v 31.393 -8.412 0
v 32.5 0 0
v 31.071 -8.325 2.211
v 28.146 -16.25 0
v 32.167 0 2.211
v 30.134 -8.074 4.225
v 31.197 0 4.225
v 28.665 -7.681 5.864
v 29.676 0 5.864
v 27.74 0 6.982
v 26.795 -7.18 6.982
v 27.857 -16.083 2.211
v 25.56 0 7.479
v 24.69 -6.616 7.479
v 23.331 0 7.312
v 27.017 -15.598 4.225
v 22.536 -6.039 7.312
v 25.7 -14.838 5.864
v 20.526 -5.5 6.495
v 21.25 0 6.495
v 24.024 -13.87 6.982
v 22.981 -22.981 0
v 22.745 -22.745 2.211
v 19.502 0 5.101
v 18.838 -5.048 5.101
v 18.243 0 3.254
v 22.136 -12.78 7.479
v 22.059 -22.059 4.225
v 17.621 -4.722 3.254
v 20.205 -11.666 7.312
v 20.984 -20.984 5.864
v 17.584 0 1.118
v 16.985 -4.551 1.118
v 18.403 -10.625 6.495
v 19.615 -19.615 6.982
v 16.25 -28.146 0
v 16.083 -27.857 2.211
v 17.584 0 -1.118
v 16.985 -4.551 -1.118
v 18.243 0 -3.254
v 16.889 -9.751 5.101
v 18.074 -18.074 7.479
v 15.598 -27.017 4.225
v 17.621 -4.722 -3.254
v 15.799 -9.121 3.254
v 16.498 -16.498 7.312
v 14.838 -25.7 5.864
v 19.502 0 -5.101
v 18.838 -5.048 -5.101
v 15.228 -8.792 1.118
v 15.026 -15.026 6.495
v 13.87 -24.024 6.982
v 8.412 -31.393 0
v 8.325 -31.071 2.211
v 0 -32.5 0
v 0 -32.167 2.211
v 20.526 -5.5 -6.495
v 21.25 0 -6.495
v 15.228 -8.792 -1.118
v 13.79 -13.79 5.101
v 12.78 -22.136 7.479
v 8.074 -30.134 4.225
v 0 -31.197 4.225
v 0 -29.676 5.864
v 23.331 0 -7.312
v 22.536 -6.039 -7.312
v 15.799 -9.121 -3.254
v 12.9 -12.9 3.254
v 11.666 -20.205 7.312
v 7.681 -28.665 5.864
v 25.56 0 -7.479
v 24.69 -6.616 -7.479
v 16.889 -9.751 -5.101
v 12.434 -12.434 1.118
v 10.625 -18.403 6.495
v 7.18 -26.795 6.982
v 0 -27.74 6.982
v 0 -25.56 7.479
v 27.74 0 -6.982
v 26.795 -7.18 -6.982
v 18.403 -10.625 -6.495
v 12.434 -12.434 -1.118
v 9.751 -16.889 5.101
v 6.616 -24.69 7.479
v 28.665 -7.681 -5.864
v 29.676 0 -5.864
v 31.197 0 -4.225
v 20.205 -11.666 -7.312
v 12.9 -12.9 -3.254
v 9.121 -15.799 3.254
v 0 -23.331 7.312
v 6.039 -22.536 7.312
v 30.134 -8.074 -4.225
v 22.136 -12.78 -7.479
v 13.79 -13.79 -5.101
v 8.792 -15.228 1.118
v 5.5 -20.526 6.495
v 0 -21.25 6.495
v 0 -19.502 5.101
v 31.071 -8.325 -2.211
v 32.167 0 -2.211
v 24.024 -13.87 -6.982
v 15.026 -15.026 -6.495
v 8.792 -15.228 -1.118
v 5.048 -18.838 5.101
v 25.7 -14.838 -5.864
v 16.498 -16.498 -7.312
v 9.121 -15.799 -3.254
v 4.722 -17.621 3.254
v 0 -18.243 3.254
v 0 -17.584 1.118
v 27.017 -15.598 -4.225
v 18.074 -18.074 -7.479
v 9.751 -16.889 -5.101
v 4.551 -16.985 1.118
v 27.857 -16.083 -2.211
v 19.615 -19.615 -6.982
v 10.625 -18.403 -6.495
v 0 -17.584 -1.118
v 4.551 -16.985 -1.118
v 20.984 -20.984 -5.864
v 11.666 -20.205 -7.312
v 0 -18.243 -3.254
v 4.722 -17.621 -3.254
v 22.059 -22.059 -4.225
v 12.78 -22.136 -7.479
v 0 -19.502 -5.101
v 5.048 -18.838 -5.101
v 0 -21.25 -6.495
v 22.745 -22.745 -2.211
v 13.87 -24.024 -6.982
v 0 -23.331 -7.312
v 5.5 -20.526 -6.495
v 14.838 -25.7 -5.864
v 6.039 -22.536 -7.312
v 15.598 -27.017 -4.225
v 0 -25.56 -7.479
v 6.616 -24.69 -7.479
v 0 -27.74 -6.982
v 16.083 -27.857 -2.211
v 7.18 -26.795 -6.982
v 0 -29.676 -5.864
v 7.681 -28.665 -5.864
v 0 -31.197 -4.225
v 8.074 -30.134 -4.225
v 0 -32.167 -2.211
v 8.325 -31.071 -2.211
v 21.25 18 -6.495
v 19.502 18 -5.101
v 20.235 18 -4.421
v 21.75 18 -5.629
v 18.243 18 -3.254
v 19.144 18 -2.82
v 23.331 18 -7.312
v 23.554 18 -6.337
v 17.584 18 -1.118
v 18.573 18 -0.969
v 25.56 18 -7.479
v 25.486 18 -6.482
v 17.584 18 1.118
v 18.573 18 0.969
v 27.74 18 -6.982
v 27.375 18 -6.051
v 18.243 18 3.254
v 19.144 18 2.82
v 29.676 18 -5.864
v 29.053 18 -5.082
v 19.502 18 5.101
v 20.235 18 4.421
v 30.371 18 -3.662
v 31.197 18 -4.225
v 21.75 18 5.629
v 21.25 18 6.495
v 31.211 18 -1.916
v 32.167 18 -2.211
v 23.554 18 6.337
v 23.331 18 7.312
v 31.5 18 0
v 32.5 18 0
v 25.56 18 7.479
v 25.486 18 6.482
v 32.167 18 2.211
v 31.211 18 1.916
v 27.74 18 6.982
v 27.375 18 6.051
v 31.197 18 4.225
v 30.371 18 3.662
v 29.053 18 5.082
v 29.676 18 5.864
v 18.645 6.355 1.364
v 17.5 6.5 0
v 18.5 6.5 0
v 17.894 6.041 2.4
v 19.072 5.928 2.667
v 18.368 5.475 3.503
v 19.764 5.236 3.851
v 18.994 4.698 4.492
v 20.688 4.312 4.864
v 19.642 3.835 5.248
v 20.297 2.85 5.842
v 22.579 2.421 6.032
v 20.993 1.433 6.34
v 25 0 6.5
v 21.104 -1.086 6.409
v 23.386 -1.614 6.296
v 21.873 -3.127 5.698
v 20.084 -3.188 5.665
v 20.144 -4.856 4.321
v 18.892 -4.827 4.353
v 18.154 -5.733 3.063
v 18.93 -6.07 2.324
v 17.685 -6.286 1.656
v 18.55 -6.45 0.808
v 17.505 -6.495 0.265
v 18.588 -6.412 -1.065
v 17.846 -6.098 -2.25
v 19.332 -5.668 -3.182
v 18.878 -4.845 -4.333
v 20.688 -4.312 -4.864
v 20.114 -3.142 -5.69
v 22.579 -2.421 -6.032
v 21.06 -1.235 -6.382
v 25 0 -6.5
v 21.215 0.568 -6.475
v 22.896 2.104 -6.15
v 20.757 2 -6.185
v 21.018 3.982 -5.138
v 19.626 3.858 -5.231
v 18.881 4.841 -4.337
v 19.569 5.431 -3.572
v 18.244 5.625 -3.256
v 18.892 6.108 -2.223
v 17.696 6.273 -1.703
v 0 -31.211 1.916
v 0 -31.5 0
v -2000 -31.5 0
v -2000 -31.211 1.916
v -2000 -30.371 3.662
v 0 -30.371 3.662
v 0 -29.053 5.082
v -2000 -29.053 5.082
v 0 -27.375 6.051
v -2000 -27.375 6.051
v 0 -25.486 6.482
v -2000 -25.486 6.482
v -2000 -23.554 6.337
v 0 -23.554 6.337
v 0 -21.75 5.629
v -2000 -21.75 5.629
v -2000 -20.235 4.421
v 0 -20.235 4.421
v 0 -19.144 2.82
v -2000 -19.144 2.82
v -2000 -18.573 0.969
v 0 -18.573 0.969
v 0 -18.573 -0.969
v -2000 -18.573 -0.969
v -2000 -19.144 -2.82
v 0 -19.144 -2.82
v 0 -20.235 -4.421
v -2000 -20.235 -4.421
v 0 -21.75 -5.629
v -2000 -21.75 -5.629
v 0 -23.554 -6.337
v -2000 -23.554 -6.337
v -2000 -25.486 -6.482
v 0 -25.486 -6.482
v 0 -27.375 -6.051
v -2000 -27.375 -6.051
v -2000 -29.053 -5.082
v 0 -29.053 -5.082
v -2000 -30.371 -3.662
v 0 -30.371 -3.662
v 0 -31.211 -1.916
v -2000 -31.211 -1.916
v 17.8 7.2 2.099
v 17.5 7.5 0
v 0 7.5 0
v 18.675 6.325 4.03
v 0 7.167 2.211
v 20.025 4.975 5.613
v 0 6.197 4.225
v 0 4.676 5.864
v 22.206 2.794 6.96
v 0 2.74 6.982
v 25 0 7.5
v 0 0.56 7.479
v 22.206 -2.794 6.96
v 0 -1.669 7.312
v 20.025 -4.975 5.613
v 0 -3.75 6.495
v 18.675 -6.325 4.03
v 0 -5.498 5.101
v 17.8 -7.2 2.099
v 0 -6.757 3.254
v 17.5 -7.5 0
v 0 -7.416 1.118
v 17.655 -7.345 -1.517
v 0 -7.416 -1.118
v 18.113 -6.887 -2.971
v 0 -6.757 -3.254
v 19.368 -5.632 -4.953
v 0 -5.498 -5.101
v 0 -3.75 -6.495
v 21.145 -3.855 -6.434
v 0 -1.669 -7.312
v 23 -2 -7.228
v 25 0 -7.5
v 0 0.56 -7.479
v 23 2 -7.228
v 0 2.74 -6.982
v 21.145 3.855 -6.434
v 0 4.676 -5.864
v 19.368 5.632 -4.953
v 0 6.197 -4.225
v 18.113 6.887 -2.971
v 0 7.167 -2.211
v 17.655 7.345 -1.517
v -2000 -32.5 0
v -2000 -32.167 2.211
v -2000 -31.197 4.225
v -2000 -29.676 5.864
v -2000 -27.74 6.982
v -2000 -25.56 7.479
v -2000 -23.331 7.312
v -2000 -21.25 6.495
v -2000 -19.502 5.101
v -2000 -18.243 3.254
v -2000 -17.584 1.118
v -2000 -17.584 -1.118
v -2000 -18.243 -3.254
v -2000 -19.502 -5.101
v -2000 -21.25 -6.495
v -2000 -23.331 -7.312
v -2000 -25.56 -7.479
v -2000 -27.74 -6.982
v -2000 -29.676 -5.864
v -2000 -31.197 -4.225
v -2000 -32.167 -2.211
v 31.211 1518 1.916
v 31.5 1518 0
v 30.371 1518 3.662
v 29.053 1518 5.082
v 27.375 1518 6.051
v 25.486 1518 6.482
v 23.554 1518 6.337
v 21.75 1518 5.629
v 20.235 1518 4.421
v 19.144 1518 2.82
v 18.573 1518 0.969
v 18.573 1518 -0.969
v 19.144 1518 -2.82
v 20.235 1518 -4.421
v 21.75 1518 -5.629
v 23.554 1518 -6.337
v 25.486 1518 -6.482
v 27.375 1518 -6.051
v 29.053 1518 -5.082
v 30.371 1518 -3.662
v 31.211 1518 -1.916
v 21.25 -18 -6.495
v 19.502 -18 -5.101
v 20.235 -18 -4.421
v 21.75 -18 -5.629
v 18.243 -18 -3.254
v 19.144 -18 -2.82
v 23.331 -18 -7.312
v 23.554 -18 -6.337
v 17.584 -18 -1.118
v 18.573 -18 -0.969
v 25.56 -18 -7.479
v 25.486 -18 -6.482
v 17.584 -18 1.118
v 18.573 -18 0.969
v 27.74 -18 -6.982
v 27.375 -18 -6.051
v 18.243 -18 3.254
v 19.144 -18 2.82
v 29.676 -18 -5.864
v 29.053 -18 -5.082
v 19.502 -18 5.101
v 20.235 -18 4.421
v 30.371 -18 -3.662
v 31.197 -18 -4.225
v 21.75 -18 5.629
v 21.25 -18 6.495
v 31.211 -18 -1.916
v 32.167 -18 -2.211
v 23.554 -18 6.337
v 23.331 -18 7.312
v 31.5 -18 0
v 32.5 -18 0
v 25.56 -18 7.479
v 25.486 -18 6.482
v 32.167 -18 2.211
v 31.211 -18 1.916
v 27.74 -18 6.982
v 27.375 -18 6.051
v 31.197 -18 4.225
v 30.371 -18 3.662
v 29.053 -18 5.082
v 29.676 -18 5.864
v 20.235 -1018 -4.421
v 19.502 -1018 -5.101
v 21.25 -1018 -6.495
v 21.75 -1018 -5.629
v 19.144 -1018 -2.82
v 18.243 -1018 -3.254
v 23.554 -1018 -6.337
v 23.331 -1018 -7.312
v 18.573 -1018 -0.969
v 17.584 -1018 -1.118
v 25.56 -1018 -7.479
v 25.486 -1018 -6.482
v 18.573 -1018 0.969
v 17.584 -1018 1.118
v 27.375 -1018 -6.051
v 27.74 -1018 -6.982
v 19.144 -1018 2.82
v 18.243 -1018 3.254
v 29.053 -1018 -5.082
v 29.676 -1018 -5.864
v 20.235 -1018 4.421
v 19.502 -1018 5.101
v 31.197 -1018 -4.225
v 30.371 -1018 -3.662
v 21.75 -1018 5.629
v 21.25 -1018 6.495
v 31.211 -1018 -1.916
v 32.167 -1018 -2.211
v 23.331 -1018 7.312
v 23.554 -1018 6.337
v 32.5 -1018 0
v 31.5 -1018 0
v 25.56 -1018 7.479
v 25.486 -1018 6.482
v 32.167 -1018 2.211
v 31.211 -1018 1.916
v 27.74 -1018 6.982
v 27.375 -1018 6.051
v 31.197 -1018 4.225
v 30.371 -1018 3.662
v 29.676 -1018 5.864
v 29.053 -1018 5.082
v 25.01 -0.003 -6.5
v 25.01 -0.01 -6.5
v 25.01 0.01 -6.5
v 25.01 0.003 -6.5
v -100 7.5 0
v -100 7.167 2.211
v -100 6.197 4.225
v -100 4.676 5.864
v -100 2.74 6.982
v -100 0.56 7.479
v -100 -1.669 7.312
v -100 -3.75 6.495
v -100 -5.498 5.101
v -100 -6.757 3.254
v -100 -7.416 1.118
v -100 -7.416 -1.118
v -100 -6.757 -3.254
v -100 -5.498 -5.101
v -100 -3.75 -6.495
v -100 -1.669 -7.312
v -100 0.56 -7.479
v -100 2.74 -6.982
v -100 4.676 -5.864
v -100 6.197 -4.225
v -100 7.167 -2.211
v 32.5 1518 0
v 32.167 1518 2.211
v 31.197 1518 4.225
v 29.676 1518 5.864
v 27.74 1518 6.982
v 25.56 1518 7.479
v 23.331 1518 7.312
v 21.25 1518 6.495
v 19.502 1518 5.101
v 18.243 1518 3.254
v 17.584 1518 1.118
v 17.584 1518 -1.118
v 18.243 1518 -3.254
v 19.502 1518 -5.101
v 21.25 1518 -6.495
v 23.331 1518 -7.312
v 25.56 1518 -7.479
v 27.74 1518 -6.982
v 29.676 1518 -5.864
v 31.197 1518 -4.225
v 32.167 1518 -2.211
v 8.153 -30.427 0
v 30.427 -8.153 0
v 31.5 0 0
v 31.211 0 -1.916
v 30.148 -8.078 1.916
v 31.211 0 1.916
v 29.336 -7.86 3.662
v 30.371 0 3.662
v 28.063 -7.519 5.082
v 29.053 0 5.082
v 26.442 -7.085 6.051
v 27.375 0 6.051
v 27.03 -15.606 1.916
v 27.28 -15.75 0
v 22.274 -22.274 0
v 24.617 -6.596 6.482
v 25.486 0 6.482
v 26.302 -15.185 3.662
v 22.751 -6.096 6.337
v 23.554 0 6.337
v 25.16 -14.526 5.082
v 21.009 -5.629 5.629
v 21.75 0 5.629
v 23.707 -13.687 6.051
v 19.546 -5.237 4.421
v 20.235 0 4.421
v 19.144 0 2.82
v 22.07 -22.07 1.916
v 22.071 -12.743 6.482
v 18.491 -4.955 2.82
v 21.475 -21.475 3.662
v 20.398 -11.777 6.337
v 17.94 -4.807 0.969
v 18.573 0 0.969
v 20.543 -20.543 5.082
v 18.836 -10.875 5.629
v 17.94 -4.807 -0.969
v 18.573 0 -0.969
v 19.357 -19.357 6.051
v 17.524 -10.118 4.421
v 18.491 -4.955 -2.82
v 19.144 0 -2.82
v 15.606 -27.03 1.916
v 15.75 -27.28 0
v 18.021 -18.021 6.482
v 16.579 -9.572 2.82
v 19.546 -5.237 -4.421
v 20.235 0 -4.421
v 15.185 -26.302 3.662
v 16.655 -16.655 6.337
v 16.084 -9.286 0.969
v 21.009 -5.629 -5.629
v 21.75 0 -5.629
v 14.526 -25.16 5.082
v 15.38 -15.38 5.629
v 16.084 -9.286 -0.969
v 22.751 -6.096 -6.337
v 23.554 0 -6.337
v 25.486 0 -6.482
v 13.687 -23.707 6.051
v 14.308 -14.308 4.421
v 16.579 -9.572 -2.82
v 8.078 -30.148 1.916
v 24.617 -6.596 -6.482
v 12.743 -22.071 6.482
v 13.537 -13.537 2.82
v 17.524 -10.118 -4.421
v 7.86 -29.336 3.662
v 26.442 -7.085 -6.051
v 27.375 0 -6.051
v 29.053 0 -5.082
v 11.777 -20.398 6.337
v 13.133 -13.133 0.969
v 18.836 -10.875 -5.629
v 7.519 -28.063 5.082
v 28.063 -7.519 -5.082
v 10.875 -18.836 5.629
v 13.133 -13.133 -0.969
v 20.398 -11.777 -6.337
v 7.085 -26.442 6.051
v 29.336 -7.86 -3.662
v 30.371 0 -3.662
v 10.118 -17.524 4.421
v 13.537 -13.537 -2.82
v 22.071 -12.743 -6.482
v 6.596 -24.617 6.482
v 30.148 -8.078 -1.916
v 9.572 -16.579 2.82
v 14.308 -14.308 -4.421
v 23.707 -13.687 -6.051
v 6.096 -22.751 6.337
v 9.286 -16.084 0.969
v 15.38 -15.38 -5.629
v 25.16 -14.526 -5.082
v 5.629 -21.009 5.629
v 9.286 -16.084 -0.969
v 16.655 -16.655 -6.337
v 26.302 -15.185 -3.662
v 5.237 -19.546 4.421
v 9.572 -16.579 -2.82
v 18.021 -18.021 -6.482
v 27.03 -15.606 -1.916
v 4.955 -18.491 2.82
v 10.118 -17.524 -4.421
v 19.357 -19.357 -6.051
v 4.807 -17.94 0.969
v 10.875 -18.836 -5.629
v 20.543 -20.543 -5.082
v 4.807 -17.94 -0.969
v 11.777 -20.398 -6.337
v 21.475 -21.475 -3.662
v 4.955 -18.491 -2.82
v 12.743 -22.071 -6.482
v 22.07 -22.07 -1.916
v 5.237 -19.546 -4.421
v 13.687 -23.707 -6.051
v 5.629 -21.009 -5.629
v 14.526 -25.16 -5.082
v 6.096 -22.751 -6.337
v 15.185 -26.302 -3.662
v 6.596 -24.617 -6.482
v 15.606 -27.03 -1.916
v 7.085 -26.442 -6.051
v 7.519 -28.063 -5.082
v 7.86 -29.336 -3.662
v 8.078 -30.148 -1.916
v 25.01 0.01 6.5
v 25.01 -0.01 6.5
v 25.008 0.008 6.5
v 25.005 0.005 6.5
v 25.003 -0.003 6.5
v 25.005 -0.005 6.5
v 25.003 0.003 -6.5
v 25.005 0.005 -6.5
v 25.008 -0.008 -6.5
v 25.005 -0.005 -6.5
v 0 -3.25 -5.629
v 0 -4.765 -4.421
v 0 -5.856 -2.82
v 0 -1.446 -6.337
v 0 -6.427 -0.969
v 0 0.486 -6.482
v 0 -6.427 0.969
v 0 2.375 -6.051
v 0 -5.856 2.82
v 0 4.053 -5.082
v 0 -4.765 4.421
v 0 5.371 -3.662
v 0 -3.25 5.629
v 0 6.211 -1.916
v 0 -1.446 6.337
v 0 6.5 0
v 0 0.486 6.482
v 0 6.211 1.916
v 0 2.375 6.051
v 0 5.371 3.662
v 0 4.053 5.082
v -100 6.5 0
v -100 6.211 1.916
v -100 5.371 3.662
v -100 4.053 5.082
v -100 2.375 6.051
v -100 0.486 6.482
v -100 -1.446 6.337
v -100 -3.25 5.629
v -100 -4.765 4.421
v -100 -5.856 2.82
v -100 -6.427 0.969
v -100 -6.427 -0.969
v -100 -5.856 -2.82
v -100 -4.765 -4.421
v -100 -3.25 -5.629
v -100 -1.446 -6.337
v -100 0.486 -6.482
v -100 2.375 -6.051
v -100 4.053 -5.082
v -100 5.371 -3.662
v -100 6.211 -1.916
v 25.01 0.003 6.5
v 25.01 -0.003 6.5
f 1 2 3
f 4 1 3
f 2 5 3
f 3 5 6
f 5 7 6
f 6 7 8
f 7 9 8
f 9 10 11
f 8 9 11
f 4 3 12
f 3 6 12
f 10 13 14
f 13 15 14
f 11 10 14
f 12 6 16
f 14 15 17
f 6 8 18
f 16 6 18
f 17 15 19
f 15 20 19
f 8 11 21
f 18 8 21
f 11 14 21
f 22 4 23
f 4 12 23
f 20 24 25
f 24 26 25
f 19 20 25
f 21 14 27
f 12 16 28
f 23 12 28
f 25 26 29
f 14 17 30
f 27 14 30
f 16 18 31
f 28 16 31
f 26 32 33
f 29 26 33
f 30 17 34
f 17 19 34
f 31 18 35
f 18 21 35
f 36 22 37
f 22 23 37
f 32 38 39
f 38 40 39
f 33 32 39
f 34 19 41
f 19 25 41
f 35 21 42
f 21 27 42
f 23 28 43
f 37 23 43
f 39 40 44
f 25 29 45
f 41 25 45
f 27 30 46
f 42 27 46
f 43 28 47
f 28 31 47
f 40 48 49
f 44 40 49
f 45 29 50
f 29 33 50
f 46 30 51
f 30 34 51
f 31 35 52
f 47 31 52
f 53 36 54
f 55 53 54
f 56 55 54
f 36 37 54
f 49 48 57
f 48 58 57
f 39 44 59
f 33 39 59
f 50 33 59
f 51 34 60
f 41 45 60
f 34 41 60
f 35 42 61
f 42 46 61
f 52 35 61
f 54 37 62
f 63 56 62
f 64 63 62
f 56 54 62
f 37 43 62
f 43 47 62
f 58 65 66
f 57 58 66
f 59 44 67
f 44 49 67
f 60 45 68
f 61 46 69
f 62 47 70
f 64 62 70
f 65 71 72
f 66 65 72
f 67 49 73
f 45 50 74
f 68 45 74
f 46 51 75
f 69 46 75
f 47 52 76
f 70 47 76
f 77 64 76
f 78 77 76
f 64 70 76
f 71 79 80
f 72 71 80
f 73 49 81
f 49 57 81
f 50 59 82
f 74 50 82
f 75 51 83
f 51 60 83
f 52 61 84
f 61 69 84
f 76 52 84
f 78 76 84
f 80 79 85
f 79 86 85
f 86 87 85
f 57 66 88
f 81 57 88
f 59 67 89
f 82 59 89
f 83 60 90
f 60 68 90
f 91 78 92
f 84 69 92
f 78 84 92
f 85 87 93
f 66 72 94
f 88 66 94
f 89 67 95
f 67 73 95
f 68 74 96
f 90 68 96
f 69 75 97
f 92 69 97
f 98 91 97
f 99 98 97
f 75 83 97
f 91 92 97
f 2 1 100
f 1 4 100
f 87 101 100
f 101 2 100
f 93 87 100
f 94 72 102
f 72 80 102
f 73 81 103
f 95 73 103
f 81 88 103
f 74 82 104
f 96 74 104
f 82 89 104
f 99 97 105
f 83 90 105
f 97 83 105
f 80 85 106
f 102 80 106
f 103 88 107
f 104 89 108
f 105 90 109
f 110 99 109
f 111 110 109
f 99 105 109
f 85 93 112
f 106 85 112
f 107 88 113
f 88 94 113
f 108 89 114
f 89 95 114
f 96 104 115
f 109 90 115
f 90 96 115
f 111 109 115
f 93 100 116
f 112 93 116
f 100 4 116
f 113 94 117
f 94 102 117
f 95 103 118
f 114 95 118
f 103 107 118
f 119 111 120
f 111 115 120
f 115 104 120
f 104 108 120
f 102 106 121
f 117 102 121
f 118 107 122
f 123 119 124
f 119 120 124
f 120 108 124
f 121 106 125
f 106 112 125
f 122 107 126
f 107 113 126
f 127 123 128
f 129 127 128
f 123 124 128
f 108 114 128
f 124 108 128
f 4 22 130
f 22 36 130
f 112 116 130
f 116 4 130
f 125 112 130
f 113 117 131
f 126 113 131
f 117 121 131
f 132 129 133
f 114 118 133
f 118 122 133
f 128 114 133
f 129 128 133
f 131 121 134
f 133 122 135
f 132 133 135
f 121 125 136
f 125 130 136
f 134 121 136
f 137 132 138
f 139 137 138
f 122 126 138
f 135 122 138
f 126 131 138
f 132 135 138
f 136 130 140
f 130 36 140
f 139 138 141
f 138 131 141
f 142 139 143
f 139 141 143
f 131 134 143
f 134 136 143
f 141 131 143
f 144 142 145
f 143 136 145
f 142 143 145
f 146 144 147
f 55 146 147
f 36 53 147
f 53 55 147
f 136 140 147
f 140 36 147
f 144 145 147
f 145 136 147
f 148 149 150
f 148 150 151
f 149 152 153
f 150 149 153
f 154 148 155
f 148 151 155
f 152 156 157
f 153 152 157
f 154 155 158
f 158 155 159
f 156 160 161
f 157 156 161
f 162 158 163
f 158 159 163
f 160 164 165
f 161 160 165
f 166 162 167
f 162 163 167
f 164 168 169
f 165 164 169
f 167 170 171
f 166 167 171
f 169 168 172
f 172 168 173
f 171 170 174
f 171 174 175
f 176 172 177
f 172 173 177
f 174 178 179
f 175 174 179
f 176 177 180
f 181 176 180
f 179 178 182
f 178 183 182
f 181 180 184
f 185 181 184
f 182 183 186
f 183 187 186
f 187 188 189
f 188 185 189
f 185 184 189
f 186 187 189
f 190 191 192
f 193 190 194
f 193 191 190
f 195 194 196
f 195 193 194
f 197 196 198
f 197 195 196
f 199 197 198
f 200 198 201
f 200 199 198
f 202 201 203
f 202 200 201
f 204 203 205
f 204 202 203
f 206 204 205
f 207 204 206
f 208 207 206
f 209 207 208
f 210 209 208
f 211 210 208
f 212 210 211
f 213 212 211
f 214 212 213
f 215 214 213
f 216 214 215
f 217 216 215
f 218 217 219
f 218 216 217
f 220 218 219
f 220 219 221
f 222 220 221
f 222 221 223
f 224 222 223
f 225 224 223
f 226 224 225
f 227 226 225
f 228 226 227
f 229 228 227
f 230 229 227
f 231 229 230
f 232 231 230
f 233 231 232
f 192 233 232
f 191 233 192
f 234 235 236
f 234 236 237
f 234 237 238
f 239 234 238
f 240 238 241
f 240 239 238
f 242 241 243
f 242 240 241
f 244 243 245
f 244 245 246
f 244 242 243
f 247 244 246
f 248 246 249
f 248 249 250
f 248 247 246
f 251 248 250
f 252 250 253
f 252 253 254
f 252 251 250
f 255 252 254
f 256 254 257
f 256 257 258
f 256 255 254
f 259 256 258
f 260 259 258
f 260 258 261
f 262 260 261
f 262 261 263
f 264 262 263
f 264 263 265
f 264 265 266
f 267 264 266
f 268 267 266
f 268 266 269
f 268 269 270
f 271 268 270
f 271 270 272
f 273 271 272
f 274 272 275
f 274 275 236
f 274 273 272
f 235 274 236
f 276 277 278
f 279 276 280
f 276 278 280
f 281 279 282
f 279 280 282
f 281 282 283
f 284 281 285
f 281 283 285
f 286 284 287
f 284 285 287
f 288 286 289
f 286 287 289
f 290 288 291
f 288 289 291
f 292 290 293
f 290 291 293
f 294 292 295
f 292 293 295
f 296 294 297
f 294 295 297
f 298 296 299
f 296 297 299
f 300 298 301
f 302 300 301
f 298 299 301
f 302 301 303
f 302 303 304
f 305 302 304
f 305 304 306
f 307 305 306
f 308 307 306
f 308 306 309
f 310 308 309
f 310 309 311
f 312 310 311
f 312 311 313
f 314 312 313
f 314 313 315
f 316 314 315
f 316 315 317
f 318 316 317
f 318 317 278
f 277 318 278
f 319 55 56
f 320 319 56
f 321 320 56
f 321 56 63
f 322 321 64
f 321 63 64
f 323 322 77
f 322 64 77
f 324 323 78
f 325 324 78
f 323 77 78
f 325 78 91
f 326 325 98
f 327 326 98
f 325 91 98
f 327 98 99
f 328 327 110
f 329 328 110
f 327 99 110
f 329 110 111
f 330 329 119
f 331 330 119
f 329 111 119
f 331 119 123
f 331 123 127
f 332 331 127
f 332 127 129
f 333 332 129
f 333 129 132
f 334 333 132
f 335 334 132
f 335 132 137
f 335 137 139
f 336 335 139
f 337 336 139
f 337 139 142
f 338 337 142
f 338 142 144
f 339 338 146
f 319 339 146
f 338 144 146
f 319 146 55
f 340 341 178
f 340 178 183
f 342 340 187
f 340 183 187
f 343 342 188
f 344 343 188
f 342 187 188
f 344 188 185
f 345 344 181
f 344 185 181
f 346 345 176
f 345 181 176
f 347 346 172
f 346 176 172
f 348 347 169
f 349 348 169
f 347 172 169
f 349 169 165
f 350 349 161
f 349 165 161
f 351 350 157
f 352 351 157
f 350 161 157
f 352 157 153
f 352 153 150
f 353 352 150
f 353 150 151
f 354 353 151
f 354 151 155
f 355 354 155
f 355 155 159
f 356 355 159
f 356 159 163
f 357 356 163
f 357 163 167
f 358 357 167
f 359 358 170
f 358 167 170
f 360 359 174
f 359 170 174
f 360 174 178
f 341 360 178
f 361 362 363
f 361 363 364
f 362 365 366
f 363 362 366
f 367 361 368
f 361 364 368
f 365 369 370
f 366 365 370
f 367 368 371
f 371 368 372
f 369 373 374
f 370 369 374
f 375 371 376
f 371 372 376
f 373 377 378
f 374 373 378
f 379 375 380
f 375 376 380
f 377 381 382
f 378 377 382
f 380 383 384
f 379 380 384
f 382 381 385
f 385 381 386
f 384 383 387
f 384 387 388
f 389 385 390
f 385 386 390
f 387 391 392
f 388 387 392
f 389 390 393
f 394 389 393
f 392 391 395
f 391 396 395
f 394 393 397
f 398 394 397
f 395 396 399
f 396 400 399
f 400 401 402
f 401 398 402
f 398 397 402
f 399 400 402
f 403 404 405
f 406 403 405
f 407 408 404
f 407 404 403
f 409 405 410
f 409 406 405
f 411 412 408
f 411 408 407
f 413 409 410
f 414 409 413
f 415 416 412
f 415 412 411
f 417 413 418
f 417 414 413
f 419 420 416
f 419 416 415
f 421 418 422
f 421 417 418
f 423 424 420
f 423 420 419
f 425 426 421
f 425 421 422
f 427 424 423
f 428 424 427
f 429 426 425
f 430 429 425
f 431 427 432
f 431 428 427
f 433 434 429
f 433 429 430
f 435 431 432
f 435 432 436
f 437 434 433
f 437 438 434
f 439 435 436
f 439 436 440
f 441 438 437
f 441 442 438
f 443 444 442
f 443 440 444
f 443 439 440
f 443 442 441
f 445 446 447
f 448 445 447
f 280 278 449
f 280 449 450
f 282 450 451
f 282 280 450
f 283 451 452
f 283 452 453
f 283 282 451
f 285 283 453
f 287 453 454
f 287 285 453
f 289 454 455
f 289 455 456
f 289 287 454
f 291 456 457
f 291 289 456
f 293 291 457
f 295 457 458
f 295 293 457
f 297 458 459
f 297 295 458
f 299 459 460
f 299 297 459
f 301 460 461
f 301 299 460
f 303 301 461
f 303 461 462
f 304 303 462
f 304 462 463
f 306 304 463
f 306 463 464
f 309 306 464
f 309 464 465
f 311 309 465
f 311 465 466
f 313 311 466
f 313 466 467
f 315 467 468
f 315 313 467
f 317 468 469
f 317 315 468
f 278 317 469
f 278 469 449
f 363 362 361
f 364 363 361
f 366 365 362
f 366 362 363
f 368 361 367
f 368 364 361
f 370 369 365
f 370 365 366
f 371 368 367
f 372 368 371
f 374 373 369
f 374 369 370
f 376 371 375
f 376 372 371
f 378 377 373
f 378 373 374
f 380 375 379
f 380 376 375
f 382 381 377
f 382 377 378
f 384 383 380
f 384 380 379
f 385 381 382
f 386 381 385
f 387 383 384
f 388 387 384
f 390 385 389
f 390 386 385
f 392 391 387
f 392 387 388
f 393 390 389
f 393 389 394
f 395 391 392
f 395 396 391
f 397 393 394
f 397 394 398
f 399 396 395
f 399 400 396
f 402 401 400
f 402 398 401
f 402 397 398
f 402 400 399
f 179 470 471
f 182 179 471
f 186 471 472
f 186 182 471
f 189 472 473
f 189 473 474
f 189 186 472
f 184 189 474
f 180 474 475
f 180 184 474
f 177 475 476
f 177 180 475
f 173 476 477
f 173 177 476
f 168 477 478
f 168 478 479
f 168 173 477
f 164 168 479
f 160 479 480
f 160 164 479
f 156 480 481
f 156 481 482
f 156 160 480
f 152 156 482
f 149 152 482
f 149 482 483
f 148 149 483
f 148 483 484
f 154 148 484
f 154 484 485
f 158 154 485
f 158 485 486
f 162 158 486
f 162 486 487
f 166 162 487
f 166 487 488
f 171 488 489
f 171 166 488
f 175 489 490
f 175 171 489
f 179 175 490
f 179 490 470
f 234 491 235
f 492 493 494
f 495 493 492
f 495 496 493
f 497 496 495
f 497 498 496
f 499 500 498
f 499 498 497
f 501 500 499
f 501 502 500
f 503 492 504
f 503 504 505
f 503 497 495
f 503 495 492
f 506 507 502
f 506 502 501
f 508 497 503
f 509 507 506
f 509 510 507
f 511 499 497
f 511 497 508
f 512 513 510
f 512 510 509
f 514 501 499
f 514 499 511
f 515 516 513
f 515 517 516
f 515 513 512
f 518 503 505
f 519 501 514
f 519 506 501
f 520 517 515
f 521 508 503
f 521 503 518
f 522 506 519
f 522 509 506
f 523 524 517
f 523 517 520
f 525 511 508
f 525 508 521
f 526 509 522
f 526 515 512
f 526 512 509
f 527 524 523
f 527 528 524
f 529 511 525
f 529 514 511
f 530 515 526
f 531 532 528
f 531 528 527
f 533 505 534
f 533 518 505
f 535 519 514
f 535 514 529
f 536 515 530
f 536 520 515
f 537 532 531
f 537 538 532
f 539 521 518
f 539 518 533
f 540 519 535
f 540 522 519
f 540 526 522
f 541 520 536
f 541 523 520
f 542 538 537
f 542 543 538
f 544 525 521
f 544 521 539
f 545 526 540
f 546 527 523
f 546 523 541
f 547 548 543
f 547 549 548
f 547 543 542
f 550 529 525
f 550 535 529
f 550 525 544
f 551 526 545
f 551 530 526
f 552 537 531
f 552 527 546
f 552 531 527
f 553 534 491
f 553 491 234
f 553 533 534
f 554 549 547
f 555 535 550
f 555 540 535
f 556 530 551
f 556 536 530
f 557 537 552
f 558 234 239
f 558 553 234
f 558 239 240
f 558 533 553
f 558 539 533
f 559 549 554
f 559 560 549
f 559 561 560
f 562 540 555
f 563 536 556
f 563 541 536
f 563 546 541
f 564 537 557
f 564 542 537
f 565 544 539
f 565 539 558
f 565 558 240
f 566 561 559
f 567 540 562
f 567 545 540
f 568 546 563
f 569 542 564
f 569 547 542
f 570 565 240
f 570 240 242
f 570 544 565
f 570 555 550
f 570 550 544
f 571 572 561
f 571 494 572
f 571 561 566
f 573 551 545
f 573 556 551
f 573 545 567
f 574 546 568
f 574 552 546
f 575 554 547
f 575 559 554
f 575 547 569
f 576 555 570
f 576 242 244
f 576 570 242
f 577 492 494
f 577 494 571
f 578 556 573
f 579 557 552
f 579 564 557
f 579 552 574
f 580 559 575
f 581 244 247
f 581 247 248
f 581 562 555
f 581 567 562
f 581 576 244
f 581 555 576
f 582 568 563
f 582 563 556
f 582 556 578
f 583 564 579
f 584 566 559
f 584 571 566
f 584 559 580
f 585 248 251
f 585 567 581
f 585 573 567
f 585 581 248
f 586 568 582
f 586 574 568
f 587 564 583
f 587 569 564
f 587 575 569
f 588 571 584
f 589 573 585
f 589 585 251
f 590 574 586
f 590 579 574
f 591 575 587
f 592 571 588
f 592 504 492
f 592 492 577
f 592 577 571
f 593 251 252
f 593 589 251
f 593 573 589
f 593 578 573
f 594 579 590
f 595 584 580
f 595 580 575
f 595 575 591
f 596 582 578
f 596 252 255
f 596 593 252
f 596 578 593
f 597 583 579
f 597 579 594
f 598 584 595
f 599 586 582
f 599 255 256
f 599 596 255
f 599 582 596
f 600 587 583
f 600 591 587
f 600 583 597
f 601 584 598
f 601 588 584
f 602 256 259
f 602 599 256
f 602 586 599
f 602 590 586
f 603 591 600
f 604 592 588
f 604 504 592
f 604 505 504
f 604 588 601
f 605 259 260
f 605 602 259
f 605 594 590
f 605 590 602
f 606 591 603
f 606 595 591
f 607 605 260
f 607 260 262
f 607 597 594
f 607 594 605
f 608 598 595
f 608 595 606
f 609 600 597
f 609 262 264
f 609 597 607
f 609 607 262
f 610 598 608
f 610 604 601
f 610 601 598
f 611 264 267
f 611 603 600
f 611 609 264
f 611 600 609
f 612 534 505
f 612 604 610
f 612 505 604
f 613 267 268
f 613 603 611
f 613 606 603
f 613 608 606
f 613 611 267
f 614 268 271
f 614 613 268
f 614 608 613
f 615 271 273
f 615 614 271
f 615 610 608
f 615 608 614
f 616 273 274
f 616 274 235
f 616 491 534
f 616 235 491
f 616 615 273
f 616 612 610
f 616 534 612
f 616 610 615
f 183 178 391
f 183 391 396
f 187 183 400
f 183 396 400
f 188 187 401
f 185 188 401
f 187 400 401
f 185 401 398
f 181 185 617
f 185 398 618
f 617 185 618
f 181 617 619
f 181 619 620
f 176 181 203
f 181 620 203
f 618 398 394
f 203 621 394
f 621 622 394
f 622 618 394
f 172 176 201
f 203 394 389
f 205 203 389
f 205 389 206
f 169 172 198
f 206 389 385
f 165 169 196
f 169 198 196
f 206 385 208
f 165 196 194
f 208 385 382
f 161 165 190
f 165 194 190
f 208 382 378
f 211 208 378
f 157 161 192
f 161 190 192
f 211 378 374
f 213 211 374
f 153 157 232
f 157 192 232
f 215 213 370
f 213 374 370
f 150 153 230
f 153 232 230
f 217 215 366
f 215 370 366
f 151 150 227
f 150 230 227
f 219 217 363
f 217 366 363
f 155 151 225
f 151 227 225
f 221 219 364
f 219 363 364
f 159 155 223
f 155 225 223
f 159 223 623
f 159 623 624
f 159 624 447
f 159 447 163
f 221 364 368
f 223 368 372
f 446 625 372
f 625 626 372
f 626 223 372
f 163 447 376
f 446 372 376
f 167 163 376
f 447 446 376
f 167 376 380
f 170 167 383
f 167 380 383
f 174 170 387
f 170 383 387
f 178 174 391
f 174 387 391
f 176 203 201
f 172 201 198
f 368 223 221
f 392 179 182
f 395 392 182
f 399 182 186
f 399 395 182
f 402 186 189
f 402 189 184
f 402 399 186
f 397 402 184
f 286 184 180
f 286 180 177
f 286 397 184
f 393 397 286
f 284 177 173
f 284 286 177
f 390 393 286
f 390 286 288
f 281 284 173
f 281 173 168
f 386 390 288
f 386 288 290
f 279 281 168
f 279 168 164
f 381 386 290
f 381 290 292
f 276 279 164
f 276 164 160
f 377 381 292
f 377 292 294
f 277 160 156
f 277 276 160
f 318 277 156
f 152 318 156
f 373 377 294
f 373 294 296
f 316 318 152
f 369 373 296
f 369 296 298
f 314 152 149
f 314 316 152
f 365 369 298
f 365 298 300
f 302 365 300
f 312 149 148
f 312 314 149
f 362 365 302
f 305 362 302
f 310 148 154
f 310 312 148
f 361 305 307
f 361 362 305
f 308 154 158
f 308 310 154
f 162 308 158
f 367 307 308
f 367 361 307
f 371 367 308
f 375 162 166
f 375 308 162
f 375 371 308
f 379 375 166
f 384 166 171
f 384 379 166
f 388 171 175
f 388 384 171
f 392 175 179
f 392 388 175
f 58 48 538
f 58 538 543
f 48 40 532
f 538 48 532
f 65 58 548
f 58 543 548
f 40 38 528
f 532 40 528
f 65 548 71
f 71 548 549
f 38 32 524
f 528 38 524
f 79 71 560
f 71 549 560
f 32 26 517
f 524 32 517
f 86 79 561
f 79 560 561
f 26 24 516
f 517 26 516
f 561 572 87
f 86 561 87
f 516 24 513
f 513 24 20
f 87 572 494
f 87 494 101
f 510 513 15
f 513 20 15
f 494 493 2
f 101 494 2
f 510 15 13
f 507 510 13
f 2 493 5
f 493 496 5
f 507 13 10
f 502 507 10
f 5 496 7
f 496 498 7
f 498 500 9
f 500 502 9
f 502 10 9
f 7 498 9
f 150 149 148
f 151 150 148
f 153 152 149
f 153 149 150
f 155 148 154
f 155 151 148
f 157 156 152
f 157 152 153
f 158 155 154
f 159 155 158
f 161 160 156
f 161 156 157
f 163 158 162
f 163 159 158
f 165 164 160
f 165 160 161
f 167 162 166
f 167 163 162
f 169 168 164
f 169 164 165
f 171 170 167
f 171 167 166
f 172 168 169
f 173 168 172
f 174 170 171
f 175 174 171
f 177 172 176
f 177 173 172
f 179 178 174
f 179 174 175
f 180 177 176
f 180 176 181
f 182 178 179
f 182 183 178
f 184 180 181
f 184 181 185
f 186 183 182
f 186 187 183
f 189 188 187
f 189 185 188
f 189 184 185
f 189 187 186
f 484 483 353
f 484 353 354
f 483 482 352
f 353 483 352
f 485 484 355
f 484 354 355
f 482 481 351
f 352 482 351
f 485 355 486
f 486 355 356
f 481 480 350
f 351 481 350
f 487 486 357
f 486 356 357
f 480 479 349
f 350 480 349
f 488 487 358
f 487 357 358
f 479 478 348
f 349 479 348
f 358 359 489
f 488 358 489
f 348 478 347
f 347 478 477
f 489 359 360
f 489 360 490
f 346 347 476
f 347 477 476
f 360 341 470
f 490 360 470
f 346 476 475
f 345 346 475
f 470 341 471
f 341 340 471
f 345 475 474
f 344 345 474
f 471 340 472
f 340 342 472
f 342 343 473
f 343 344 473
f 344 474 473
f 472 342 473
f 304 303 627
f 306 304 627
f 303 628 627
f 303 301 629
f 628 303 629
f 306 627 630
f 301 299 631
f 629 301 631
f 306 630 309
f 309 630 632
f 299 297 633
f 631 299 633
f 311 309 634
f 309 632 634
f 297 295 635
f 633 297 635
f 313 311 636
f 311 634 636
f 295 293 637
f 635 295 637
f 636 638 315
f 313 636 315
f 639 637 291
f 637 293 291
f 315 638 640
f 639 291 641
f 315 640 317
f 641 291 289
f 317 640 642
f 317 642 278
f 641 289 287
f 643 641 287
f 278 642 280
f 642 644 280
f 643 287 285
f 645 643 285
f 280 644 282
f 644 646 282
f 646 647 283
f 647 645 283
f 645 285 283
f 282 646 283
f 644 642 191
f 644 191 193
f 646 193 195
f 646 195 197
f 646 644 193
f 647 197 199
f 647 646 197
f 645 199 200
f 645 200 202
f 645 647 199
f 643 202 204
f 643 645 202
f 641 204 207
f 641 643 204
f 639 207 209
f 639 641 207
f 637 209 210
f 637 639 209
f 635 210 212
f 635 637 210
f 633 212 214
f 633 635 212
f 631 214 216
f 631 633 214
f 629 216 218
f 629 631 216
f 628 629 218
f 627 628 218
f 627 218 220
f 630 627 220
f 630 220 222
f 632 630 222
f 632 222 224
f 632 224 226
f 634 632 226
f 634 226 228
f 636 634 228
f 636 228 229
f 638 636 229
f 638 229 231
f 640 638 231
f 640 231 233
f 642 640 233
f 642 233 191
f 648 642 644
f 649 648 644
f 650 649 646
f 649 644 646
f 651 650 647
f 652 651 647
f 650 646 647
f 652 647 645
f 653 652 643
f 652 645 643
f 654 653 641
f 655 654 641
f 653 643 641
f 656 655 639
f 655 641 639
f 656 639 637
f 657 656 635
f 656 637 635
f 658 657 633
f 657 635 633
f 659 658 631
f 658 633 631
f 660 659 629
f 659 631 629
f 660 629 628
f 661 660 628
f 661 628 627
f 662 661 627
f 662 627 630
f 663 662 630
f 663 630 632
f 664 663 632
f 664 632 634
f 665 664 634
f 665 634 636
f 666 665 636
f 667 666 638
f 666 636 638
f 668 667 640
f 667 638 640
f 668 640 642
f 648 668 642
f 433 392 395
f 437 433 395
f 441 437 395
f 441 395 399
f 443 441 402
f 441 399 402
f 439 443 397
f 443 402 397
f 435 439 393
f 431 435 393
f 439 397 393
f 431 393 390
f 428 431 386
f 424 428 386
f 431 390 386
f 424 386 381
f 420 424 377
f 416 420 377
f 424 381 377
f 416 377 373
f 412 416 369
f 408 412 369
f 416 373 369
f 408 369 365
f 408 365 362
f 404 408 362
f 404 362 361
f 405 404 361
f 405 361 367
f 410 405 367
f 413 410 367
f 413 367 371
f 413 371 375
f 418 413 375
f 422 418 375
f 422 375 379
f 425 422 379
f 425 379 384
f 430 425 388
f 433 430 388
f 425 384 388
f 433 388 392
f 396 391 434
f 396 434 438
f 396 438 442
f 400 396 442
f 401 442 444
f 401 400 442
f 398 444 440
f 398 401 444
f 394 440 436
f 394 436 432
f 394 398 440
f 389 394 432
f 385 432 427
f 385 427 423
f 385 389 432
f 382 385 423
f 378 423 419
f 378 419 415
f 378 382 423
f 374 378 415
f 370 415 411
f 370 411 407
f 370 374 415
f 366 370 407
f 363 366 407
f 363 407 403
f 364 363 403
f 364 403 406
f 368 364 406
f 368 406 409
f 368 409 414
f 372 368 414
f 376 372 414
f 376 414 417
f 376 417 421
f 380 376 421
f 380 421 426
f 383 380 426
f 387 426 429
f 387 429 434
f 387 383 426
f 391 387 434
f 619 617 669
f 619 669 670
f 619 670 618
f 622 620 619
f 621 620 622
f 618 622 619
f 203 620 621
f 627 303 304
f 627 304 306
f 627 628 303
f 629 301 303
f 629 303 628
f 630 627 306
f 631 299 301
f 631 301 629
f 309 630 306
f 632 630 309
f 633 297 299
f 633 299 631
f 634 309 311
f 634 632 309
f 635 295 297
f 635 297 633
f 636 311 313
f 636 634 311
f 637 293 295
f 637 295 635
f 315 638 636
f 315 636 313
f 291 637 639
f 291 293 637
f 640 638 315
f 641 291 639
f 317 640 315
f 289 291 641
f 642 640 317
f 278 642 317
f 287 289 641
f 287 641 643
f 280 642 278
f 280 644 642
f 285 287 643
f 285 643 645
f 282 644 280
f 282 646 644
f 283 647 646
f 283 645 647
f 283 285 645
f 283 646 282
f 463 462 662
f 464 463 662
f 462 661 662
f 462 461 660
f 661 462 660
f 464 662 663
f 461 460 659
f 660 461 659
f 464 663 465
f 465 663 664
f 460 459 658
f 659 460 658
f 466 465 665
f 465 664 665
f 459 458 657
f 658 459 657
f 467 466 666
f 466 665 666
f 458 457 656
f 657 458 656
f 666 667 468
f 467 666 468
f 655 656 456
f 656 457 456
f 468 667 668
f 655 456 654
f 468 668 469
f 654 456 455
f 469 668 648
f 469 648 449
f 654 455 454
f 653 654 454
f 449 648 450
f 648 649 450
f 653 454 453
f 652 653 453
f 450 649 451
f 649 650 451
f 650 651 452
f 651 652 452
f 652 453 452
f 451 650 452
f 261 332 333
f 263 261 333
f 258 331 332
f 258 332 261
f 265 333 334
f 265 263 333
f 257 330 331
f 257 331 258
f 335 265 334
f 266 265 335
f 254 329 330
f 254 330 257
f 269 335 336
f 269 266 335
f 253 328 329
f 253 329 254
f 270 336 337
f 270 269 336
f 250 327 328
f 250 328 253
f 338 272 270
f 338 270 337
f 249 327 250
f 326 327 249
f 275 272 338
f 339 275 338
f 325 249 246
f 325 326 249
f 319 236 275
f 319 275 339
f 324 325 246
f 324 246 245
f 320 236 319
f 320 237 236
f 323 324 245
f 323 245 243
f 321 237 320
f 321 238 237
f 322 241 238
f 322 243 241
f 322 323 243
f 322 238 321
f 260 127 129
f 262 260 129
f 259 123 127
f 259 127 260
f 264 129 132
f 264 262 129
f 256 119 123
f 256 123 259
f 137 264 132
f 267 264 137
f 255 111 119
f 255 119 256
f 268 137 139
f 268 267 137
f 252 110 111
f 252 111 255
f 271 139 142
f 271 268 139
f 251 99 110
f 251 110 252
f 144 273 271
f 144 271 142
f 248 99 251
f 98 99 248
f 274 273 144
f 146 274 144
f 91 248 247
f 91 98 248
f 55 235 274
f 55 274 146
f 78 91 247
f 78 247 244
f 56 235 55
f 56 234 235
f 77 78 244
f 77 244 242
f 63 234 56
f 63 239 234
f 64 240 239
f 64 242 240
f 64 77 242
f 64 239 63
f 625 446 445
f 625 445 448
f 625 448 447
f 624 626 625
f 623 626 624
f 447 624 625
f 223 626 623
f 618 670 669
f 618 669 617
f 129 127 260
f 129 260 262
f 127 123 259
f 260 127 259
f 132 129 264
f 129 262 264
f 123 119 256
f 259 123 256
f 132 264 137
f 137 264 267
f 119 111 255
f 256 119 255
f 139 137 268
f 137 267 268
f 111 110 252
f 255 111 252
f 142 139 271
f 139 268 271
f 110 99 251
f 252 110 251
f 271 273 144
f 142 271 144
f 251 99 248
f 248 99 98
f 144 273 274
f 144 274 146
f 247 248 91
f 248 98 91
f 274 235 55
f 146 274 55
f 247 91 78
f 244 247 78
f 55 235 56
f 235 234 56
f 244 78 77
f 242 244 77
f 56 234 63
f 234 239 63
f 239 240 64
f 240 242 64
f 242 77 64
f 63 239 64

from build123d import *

# Parameters (mm, degrees)
F0_R          = 7.5
F0_R_2        = 6.5
F1_DEPTH      = 18
F1_DEPTH_BACK = 18
F2_R          = 6.5
F3_DEPTH      = 25.01
F2_R_2        = 7.5
F5_DEPTH      = 1000
F6_DEPTH      = 100
F7_DEPTH      = 1500
F8_ANGLE      = 90
F9_DEPTH      = 2000


with BuildPart() as f1:
    # F0 (on Front) → F1 (new body, two sides)
    with BuildSketch(Plane.XZ) as f1_sk:
        with Locations((25, 0)):
            Circle(F0_R)
        with Locations((25, 0)):
            Circle(F0_R_2, mode=Mode.SUBTRACT)
    extrude(amount=F1_DEPTH)
    extrude(f1_sk.sketch, amount=-F1_DEPTH_BACK)

    # F2 (on Right) → F3 (cut, up to face)
    with BuildSketch(Plane.YZ):
        Circle(F2_R)
    extrude(amount=F3_DEPTH, mode=Mode.SUBTRACT)

    # F2 (on Right) → F4 (join, up to the next surface of F1)
    with BuildSketch(Plane.YZ):
        Circle(F2_R_2)
        Circle(F2_R, mode=Mode.SUBTRACT)
    extrude(until=Until.NEXT)


with BuildPart() as f5:
    # F5 (new): a face of the model
    f5_faces = [f1.part.faces().sort_by_distance(p)[0] for p in [
        (17.7121320344, -18, 0),
    ]]
    extrude(f5_faces, amount=F5_DEPTH)


with BuildPart() as f6:
    # F2 (on Right) → F6 (new body)
    with BuildSketch(Plane.YZ):
        Circle(F2_R_2)
        Circle(F2_R, mode=Mode.SUBTRACT)
    extrude(amount=-F6_DEPTH)


with BuildPart() as f7:
    # F7 (new): a face of the model
    f7_faces = [f1.part.faces().sort_by_distance(p)[0] for p in [
        (17.7121320344, 18, 0),
    ]]
    extrude(f7_faces, amount=F7_DEPTH)


with BuildPart() as f8:
    # F0 (on Front) → F8 (revolve)
    with BuildSketch(Plane.XZ):
        with Locations((25, 0)):
            Circle(F0_R)
        with Locations((25, 0)):
            Circle(F0_R_2, mode=Mode.SUBTRACT)
    revolve(axis=Axis((0, 0, -8.9548928663), (0, 0, -1)), revolution_arc=F8_ANGLE)


with BuildPart() as f9:
    # F9 (new): a face of the model
    f9_faces = [f8.part.faces().sort_by_distance(p)[0] for p in [
        (0, -17.7121320344, 0),
    ]]
    extrude(f9_faces, amount=F9_DEPTH)


solid = Compound([f1.part, f5.part, f6.part, f7.part, f8.part, f9.part])
